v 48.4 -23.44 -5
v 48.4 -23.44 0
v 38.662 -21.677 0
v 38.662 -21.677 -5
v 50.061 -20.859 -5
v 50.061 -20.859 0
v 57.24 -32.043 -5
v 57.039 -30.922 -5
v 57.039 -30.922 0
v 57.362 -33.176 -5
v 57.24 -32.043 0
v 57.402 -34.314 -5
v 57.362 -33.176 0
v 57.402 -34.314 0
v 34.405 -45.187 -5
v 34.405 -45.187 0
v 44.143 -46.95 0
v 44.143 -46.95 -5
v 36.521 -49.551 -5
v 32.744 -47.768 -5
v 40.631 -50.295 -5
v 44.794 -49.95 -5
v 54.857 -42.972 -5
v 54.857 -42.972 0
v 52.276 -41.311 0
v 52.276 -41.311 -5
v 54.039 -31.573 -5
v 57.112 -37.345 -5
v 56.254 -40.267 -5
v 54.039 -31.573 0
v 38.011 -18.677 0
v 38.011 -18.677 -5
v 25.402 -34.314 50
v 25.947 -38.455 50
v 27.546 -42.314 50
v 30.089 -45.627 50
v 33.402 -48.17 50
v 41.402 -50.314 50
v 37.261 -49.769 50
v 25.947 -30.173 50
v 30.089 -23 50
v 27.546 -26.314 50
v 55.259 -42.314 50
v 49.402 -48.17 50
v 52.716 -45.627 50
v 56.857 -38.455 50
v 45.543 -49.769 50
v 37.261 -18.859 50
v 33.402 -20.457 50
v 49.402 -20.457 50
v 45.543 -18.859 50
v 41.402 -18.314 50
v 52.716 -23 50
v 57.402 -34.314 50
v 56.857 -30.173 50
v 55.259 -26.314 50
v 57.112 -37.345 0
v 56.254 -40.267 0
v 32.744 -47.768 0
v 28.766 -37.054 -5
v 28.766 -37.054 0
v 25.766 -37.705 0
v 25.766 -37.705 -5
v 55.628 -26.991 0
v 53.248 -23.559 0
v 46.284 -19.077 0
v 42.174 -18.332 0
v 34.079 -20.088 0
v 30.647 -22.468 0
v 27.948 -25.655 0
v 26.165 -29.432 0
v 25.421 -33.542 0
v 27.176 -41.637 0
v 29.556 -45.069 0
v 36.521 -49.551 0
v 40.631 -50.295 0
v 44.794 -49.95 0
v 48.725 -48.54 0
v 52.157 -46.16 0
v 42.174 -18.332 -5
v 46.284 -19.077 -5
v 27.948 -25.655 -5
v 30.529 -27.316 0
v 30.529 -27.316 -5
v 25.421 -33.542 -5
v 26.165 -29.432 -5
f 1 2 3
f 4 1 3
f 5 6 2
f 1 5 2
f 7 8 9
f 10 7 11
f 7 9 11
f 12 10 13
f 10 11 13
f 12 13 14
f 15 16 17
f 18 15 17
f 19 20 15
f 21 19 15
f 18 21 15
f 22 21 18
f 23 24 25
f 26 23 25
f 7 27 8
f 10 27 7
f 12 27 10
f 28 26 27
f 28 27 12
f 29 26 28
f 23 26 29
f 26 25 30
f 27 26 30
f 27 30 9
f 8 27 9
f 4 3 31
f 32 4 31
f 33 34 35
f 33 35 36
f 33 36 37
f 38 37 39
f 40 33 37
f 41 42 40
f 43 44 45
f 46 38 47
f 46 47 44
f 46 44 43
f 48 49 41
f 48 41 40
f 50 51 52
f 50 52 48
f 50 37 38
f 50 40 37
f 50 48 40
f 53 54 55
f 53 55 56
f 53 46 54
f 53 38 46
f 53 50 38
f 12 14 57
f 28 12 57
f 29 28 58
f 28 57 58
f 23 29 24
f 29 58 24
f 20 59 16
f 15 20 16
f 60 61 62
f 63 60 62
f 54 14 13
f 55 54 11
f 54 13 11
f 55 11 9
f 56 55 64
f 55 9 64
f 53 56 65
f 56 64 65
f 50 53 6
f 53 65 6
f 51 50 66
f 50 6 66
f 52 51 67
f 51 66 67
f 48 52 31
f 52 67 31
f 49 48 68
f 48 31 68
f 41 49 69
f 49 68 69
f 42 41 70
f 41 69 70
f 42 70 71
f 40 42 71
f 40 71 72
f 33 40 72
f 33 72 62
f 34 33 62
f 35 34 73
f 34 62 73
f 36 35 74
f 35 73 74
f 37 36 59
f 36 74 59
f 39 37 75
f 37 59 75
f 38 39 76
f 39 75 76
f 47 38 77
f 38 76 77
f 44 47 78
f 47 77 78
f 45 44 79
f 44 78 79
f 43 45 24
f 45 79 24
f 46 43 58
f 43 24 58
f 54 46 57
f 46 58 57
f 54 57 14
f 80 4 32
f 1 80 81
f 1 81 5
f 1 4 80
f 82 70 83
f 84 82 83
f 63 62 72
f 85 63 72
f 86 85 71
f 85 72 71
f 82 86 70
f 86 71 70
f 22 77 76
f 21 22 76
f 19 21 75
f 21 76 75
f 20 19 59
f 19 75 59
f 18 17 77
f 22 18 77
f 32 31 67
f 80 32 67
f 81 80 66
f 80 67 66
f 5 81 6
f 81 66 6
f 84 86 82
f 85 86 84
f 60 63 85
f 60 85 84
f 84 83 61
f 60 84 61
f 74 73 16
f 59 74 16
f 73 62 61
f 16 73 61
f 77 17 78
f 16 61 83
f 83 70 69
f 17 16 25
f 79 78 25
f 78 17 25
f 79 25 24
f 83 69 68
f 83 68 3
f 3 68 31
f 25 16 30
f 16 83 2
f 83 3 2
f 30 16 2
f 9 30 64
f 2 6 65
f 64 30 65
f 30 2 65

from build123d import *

# Parameters (mm, degrees)
F0_R     = 16
F1_DEPTH = 50
F3_DEPTH = 5


# Not quite as in the source:
# - after a boolean that leaves OpenCascade's solid faulty, fix() repairs it


with BuildPart() as f1:
    # F0 (on Top) → F1 (new body)
    with BuildSketch(Plane.XY):
        with Locations((41.4022505283, -34.313749522)):
            Circle(F0_R)
    extrude(amount=F1_DEPTH)

    # F2 (on face) → F3 (join)
    with BuildSketch(Plane(origin=(0, 0, 0), x_dir=(1, 0, 0), z_dir=(0, 0, -1))):
        Polygon((57.0387140238, 30.9224357125), (54.8569208916, 42.9723779016), (52.2755180634, 41.3111400427), (54.0387140238, 31.573090602), align=None)
        with BuildLine():
            ThreePointArc((57.0387140238, 30.9224357125), (57.3111068029, 32.6083779976), (57.4022505283, 34.313749522))
            ThreePointArc((57.4022505283, 34.313749522), (56.7527346544, 38.8262473994), (54.8569208916, 42.9723779016))
            Line((54.8569208916, 42.9723779016), (57.0387140238, 30.9224357125))
        make_face()
        Polygon((38.0109367189, 18.6772860265), (50.060878908, 20.8590791587), (48.399641049, 23.4404819869), (38.6615916084, 21.6772860265), align=None)
        with BuildLine():
            ThreePointArc((38.0109367189, 18.6772860265), (44.252900632, 18.5697413288), (50.060878908, 20.8590791587))
            Line((50.060878908, 20.8590791587), (38.0109367189, 18.6772860265))
        make_face()
        Polygon((28.7657870328, 37.0544084419), (25.7657870328, 37.7050633314), (27.9475801651, 25.6551211423), (30.5289829933, 27.3163590013), align=None)
        with BuildLine():
            Line((27.9475801651, 25.6551211423), (25.7657870328, 37.7050633314))
            ThreePointArc((25.7657870328, 37.7050633314), (25.6582423352, 31.4630994183), (27.9475801651, 25.6551211423))
        make_face()
        Polygon((44.1429094483, 46.9502130175), (44.7935643378, 49.9502130175), (32.7436221487, 47.7684198852), (34.4048600077, 45.187017057), align=None)
        with BuildLine():
            Line((32.7436221487, 47.7684198852), (44.7935643378, 49.9502130175))
            ThreePointArc((44.7935643378, 49.9502130175), (38.5516004247, 50.0577577151), (32.7436221487, 47.7684198852))
        make_face()
    extrude(amount=F3_DEPTH)

    add(f1.part.fix(), mode=Mode.REPLACE)


solid = f1.part
